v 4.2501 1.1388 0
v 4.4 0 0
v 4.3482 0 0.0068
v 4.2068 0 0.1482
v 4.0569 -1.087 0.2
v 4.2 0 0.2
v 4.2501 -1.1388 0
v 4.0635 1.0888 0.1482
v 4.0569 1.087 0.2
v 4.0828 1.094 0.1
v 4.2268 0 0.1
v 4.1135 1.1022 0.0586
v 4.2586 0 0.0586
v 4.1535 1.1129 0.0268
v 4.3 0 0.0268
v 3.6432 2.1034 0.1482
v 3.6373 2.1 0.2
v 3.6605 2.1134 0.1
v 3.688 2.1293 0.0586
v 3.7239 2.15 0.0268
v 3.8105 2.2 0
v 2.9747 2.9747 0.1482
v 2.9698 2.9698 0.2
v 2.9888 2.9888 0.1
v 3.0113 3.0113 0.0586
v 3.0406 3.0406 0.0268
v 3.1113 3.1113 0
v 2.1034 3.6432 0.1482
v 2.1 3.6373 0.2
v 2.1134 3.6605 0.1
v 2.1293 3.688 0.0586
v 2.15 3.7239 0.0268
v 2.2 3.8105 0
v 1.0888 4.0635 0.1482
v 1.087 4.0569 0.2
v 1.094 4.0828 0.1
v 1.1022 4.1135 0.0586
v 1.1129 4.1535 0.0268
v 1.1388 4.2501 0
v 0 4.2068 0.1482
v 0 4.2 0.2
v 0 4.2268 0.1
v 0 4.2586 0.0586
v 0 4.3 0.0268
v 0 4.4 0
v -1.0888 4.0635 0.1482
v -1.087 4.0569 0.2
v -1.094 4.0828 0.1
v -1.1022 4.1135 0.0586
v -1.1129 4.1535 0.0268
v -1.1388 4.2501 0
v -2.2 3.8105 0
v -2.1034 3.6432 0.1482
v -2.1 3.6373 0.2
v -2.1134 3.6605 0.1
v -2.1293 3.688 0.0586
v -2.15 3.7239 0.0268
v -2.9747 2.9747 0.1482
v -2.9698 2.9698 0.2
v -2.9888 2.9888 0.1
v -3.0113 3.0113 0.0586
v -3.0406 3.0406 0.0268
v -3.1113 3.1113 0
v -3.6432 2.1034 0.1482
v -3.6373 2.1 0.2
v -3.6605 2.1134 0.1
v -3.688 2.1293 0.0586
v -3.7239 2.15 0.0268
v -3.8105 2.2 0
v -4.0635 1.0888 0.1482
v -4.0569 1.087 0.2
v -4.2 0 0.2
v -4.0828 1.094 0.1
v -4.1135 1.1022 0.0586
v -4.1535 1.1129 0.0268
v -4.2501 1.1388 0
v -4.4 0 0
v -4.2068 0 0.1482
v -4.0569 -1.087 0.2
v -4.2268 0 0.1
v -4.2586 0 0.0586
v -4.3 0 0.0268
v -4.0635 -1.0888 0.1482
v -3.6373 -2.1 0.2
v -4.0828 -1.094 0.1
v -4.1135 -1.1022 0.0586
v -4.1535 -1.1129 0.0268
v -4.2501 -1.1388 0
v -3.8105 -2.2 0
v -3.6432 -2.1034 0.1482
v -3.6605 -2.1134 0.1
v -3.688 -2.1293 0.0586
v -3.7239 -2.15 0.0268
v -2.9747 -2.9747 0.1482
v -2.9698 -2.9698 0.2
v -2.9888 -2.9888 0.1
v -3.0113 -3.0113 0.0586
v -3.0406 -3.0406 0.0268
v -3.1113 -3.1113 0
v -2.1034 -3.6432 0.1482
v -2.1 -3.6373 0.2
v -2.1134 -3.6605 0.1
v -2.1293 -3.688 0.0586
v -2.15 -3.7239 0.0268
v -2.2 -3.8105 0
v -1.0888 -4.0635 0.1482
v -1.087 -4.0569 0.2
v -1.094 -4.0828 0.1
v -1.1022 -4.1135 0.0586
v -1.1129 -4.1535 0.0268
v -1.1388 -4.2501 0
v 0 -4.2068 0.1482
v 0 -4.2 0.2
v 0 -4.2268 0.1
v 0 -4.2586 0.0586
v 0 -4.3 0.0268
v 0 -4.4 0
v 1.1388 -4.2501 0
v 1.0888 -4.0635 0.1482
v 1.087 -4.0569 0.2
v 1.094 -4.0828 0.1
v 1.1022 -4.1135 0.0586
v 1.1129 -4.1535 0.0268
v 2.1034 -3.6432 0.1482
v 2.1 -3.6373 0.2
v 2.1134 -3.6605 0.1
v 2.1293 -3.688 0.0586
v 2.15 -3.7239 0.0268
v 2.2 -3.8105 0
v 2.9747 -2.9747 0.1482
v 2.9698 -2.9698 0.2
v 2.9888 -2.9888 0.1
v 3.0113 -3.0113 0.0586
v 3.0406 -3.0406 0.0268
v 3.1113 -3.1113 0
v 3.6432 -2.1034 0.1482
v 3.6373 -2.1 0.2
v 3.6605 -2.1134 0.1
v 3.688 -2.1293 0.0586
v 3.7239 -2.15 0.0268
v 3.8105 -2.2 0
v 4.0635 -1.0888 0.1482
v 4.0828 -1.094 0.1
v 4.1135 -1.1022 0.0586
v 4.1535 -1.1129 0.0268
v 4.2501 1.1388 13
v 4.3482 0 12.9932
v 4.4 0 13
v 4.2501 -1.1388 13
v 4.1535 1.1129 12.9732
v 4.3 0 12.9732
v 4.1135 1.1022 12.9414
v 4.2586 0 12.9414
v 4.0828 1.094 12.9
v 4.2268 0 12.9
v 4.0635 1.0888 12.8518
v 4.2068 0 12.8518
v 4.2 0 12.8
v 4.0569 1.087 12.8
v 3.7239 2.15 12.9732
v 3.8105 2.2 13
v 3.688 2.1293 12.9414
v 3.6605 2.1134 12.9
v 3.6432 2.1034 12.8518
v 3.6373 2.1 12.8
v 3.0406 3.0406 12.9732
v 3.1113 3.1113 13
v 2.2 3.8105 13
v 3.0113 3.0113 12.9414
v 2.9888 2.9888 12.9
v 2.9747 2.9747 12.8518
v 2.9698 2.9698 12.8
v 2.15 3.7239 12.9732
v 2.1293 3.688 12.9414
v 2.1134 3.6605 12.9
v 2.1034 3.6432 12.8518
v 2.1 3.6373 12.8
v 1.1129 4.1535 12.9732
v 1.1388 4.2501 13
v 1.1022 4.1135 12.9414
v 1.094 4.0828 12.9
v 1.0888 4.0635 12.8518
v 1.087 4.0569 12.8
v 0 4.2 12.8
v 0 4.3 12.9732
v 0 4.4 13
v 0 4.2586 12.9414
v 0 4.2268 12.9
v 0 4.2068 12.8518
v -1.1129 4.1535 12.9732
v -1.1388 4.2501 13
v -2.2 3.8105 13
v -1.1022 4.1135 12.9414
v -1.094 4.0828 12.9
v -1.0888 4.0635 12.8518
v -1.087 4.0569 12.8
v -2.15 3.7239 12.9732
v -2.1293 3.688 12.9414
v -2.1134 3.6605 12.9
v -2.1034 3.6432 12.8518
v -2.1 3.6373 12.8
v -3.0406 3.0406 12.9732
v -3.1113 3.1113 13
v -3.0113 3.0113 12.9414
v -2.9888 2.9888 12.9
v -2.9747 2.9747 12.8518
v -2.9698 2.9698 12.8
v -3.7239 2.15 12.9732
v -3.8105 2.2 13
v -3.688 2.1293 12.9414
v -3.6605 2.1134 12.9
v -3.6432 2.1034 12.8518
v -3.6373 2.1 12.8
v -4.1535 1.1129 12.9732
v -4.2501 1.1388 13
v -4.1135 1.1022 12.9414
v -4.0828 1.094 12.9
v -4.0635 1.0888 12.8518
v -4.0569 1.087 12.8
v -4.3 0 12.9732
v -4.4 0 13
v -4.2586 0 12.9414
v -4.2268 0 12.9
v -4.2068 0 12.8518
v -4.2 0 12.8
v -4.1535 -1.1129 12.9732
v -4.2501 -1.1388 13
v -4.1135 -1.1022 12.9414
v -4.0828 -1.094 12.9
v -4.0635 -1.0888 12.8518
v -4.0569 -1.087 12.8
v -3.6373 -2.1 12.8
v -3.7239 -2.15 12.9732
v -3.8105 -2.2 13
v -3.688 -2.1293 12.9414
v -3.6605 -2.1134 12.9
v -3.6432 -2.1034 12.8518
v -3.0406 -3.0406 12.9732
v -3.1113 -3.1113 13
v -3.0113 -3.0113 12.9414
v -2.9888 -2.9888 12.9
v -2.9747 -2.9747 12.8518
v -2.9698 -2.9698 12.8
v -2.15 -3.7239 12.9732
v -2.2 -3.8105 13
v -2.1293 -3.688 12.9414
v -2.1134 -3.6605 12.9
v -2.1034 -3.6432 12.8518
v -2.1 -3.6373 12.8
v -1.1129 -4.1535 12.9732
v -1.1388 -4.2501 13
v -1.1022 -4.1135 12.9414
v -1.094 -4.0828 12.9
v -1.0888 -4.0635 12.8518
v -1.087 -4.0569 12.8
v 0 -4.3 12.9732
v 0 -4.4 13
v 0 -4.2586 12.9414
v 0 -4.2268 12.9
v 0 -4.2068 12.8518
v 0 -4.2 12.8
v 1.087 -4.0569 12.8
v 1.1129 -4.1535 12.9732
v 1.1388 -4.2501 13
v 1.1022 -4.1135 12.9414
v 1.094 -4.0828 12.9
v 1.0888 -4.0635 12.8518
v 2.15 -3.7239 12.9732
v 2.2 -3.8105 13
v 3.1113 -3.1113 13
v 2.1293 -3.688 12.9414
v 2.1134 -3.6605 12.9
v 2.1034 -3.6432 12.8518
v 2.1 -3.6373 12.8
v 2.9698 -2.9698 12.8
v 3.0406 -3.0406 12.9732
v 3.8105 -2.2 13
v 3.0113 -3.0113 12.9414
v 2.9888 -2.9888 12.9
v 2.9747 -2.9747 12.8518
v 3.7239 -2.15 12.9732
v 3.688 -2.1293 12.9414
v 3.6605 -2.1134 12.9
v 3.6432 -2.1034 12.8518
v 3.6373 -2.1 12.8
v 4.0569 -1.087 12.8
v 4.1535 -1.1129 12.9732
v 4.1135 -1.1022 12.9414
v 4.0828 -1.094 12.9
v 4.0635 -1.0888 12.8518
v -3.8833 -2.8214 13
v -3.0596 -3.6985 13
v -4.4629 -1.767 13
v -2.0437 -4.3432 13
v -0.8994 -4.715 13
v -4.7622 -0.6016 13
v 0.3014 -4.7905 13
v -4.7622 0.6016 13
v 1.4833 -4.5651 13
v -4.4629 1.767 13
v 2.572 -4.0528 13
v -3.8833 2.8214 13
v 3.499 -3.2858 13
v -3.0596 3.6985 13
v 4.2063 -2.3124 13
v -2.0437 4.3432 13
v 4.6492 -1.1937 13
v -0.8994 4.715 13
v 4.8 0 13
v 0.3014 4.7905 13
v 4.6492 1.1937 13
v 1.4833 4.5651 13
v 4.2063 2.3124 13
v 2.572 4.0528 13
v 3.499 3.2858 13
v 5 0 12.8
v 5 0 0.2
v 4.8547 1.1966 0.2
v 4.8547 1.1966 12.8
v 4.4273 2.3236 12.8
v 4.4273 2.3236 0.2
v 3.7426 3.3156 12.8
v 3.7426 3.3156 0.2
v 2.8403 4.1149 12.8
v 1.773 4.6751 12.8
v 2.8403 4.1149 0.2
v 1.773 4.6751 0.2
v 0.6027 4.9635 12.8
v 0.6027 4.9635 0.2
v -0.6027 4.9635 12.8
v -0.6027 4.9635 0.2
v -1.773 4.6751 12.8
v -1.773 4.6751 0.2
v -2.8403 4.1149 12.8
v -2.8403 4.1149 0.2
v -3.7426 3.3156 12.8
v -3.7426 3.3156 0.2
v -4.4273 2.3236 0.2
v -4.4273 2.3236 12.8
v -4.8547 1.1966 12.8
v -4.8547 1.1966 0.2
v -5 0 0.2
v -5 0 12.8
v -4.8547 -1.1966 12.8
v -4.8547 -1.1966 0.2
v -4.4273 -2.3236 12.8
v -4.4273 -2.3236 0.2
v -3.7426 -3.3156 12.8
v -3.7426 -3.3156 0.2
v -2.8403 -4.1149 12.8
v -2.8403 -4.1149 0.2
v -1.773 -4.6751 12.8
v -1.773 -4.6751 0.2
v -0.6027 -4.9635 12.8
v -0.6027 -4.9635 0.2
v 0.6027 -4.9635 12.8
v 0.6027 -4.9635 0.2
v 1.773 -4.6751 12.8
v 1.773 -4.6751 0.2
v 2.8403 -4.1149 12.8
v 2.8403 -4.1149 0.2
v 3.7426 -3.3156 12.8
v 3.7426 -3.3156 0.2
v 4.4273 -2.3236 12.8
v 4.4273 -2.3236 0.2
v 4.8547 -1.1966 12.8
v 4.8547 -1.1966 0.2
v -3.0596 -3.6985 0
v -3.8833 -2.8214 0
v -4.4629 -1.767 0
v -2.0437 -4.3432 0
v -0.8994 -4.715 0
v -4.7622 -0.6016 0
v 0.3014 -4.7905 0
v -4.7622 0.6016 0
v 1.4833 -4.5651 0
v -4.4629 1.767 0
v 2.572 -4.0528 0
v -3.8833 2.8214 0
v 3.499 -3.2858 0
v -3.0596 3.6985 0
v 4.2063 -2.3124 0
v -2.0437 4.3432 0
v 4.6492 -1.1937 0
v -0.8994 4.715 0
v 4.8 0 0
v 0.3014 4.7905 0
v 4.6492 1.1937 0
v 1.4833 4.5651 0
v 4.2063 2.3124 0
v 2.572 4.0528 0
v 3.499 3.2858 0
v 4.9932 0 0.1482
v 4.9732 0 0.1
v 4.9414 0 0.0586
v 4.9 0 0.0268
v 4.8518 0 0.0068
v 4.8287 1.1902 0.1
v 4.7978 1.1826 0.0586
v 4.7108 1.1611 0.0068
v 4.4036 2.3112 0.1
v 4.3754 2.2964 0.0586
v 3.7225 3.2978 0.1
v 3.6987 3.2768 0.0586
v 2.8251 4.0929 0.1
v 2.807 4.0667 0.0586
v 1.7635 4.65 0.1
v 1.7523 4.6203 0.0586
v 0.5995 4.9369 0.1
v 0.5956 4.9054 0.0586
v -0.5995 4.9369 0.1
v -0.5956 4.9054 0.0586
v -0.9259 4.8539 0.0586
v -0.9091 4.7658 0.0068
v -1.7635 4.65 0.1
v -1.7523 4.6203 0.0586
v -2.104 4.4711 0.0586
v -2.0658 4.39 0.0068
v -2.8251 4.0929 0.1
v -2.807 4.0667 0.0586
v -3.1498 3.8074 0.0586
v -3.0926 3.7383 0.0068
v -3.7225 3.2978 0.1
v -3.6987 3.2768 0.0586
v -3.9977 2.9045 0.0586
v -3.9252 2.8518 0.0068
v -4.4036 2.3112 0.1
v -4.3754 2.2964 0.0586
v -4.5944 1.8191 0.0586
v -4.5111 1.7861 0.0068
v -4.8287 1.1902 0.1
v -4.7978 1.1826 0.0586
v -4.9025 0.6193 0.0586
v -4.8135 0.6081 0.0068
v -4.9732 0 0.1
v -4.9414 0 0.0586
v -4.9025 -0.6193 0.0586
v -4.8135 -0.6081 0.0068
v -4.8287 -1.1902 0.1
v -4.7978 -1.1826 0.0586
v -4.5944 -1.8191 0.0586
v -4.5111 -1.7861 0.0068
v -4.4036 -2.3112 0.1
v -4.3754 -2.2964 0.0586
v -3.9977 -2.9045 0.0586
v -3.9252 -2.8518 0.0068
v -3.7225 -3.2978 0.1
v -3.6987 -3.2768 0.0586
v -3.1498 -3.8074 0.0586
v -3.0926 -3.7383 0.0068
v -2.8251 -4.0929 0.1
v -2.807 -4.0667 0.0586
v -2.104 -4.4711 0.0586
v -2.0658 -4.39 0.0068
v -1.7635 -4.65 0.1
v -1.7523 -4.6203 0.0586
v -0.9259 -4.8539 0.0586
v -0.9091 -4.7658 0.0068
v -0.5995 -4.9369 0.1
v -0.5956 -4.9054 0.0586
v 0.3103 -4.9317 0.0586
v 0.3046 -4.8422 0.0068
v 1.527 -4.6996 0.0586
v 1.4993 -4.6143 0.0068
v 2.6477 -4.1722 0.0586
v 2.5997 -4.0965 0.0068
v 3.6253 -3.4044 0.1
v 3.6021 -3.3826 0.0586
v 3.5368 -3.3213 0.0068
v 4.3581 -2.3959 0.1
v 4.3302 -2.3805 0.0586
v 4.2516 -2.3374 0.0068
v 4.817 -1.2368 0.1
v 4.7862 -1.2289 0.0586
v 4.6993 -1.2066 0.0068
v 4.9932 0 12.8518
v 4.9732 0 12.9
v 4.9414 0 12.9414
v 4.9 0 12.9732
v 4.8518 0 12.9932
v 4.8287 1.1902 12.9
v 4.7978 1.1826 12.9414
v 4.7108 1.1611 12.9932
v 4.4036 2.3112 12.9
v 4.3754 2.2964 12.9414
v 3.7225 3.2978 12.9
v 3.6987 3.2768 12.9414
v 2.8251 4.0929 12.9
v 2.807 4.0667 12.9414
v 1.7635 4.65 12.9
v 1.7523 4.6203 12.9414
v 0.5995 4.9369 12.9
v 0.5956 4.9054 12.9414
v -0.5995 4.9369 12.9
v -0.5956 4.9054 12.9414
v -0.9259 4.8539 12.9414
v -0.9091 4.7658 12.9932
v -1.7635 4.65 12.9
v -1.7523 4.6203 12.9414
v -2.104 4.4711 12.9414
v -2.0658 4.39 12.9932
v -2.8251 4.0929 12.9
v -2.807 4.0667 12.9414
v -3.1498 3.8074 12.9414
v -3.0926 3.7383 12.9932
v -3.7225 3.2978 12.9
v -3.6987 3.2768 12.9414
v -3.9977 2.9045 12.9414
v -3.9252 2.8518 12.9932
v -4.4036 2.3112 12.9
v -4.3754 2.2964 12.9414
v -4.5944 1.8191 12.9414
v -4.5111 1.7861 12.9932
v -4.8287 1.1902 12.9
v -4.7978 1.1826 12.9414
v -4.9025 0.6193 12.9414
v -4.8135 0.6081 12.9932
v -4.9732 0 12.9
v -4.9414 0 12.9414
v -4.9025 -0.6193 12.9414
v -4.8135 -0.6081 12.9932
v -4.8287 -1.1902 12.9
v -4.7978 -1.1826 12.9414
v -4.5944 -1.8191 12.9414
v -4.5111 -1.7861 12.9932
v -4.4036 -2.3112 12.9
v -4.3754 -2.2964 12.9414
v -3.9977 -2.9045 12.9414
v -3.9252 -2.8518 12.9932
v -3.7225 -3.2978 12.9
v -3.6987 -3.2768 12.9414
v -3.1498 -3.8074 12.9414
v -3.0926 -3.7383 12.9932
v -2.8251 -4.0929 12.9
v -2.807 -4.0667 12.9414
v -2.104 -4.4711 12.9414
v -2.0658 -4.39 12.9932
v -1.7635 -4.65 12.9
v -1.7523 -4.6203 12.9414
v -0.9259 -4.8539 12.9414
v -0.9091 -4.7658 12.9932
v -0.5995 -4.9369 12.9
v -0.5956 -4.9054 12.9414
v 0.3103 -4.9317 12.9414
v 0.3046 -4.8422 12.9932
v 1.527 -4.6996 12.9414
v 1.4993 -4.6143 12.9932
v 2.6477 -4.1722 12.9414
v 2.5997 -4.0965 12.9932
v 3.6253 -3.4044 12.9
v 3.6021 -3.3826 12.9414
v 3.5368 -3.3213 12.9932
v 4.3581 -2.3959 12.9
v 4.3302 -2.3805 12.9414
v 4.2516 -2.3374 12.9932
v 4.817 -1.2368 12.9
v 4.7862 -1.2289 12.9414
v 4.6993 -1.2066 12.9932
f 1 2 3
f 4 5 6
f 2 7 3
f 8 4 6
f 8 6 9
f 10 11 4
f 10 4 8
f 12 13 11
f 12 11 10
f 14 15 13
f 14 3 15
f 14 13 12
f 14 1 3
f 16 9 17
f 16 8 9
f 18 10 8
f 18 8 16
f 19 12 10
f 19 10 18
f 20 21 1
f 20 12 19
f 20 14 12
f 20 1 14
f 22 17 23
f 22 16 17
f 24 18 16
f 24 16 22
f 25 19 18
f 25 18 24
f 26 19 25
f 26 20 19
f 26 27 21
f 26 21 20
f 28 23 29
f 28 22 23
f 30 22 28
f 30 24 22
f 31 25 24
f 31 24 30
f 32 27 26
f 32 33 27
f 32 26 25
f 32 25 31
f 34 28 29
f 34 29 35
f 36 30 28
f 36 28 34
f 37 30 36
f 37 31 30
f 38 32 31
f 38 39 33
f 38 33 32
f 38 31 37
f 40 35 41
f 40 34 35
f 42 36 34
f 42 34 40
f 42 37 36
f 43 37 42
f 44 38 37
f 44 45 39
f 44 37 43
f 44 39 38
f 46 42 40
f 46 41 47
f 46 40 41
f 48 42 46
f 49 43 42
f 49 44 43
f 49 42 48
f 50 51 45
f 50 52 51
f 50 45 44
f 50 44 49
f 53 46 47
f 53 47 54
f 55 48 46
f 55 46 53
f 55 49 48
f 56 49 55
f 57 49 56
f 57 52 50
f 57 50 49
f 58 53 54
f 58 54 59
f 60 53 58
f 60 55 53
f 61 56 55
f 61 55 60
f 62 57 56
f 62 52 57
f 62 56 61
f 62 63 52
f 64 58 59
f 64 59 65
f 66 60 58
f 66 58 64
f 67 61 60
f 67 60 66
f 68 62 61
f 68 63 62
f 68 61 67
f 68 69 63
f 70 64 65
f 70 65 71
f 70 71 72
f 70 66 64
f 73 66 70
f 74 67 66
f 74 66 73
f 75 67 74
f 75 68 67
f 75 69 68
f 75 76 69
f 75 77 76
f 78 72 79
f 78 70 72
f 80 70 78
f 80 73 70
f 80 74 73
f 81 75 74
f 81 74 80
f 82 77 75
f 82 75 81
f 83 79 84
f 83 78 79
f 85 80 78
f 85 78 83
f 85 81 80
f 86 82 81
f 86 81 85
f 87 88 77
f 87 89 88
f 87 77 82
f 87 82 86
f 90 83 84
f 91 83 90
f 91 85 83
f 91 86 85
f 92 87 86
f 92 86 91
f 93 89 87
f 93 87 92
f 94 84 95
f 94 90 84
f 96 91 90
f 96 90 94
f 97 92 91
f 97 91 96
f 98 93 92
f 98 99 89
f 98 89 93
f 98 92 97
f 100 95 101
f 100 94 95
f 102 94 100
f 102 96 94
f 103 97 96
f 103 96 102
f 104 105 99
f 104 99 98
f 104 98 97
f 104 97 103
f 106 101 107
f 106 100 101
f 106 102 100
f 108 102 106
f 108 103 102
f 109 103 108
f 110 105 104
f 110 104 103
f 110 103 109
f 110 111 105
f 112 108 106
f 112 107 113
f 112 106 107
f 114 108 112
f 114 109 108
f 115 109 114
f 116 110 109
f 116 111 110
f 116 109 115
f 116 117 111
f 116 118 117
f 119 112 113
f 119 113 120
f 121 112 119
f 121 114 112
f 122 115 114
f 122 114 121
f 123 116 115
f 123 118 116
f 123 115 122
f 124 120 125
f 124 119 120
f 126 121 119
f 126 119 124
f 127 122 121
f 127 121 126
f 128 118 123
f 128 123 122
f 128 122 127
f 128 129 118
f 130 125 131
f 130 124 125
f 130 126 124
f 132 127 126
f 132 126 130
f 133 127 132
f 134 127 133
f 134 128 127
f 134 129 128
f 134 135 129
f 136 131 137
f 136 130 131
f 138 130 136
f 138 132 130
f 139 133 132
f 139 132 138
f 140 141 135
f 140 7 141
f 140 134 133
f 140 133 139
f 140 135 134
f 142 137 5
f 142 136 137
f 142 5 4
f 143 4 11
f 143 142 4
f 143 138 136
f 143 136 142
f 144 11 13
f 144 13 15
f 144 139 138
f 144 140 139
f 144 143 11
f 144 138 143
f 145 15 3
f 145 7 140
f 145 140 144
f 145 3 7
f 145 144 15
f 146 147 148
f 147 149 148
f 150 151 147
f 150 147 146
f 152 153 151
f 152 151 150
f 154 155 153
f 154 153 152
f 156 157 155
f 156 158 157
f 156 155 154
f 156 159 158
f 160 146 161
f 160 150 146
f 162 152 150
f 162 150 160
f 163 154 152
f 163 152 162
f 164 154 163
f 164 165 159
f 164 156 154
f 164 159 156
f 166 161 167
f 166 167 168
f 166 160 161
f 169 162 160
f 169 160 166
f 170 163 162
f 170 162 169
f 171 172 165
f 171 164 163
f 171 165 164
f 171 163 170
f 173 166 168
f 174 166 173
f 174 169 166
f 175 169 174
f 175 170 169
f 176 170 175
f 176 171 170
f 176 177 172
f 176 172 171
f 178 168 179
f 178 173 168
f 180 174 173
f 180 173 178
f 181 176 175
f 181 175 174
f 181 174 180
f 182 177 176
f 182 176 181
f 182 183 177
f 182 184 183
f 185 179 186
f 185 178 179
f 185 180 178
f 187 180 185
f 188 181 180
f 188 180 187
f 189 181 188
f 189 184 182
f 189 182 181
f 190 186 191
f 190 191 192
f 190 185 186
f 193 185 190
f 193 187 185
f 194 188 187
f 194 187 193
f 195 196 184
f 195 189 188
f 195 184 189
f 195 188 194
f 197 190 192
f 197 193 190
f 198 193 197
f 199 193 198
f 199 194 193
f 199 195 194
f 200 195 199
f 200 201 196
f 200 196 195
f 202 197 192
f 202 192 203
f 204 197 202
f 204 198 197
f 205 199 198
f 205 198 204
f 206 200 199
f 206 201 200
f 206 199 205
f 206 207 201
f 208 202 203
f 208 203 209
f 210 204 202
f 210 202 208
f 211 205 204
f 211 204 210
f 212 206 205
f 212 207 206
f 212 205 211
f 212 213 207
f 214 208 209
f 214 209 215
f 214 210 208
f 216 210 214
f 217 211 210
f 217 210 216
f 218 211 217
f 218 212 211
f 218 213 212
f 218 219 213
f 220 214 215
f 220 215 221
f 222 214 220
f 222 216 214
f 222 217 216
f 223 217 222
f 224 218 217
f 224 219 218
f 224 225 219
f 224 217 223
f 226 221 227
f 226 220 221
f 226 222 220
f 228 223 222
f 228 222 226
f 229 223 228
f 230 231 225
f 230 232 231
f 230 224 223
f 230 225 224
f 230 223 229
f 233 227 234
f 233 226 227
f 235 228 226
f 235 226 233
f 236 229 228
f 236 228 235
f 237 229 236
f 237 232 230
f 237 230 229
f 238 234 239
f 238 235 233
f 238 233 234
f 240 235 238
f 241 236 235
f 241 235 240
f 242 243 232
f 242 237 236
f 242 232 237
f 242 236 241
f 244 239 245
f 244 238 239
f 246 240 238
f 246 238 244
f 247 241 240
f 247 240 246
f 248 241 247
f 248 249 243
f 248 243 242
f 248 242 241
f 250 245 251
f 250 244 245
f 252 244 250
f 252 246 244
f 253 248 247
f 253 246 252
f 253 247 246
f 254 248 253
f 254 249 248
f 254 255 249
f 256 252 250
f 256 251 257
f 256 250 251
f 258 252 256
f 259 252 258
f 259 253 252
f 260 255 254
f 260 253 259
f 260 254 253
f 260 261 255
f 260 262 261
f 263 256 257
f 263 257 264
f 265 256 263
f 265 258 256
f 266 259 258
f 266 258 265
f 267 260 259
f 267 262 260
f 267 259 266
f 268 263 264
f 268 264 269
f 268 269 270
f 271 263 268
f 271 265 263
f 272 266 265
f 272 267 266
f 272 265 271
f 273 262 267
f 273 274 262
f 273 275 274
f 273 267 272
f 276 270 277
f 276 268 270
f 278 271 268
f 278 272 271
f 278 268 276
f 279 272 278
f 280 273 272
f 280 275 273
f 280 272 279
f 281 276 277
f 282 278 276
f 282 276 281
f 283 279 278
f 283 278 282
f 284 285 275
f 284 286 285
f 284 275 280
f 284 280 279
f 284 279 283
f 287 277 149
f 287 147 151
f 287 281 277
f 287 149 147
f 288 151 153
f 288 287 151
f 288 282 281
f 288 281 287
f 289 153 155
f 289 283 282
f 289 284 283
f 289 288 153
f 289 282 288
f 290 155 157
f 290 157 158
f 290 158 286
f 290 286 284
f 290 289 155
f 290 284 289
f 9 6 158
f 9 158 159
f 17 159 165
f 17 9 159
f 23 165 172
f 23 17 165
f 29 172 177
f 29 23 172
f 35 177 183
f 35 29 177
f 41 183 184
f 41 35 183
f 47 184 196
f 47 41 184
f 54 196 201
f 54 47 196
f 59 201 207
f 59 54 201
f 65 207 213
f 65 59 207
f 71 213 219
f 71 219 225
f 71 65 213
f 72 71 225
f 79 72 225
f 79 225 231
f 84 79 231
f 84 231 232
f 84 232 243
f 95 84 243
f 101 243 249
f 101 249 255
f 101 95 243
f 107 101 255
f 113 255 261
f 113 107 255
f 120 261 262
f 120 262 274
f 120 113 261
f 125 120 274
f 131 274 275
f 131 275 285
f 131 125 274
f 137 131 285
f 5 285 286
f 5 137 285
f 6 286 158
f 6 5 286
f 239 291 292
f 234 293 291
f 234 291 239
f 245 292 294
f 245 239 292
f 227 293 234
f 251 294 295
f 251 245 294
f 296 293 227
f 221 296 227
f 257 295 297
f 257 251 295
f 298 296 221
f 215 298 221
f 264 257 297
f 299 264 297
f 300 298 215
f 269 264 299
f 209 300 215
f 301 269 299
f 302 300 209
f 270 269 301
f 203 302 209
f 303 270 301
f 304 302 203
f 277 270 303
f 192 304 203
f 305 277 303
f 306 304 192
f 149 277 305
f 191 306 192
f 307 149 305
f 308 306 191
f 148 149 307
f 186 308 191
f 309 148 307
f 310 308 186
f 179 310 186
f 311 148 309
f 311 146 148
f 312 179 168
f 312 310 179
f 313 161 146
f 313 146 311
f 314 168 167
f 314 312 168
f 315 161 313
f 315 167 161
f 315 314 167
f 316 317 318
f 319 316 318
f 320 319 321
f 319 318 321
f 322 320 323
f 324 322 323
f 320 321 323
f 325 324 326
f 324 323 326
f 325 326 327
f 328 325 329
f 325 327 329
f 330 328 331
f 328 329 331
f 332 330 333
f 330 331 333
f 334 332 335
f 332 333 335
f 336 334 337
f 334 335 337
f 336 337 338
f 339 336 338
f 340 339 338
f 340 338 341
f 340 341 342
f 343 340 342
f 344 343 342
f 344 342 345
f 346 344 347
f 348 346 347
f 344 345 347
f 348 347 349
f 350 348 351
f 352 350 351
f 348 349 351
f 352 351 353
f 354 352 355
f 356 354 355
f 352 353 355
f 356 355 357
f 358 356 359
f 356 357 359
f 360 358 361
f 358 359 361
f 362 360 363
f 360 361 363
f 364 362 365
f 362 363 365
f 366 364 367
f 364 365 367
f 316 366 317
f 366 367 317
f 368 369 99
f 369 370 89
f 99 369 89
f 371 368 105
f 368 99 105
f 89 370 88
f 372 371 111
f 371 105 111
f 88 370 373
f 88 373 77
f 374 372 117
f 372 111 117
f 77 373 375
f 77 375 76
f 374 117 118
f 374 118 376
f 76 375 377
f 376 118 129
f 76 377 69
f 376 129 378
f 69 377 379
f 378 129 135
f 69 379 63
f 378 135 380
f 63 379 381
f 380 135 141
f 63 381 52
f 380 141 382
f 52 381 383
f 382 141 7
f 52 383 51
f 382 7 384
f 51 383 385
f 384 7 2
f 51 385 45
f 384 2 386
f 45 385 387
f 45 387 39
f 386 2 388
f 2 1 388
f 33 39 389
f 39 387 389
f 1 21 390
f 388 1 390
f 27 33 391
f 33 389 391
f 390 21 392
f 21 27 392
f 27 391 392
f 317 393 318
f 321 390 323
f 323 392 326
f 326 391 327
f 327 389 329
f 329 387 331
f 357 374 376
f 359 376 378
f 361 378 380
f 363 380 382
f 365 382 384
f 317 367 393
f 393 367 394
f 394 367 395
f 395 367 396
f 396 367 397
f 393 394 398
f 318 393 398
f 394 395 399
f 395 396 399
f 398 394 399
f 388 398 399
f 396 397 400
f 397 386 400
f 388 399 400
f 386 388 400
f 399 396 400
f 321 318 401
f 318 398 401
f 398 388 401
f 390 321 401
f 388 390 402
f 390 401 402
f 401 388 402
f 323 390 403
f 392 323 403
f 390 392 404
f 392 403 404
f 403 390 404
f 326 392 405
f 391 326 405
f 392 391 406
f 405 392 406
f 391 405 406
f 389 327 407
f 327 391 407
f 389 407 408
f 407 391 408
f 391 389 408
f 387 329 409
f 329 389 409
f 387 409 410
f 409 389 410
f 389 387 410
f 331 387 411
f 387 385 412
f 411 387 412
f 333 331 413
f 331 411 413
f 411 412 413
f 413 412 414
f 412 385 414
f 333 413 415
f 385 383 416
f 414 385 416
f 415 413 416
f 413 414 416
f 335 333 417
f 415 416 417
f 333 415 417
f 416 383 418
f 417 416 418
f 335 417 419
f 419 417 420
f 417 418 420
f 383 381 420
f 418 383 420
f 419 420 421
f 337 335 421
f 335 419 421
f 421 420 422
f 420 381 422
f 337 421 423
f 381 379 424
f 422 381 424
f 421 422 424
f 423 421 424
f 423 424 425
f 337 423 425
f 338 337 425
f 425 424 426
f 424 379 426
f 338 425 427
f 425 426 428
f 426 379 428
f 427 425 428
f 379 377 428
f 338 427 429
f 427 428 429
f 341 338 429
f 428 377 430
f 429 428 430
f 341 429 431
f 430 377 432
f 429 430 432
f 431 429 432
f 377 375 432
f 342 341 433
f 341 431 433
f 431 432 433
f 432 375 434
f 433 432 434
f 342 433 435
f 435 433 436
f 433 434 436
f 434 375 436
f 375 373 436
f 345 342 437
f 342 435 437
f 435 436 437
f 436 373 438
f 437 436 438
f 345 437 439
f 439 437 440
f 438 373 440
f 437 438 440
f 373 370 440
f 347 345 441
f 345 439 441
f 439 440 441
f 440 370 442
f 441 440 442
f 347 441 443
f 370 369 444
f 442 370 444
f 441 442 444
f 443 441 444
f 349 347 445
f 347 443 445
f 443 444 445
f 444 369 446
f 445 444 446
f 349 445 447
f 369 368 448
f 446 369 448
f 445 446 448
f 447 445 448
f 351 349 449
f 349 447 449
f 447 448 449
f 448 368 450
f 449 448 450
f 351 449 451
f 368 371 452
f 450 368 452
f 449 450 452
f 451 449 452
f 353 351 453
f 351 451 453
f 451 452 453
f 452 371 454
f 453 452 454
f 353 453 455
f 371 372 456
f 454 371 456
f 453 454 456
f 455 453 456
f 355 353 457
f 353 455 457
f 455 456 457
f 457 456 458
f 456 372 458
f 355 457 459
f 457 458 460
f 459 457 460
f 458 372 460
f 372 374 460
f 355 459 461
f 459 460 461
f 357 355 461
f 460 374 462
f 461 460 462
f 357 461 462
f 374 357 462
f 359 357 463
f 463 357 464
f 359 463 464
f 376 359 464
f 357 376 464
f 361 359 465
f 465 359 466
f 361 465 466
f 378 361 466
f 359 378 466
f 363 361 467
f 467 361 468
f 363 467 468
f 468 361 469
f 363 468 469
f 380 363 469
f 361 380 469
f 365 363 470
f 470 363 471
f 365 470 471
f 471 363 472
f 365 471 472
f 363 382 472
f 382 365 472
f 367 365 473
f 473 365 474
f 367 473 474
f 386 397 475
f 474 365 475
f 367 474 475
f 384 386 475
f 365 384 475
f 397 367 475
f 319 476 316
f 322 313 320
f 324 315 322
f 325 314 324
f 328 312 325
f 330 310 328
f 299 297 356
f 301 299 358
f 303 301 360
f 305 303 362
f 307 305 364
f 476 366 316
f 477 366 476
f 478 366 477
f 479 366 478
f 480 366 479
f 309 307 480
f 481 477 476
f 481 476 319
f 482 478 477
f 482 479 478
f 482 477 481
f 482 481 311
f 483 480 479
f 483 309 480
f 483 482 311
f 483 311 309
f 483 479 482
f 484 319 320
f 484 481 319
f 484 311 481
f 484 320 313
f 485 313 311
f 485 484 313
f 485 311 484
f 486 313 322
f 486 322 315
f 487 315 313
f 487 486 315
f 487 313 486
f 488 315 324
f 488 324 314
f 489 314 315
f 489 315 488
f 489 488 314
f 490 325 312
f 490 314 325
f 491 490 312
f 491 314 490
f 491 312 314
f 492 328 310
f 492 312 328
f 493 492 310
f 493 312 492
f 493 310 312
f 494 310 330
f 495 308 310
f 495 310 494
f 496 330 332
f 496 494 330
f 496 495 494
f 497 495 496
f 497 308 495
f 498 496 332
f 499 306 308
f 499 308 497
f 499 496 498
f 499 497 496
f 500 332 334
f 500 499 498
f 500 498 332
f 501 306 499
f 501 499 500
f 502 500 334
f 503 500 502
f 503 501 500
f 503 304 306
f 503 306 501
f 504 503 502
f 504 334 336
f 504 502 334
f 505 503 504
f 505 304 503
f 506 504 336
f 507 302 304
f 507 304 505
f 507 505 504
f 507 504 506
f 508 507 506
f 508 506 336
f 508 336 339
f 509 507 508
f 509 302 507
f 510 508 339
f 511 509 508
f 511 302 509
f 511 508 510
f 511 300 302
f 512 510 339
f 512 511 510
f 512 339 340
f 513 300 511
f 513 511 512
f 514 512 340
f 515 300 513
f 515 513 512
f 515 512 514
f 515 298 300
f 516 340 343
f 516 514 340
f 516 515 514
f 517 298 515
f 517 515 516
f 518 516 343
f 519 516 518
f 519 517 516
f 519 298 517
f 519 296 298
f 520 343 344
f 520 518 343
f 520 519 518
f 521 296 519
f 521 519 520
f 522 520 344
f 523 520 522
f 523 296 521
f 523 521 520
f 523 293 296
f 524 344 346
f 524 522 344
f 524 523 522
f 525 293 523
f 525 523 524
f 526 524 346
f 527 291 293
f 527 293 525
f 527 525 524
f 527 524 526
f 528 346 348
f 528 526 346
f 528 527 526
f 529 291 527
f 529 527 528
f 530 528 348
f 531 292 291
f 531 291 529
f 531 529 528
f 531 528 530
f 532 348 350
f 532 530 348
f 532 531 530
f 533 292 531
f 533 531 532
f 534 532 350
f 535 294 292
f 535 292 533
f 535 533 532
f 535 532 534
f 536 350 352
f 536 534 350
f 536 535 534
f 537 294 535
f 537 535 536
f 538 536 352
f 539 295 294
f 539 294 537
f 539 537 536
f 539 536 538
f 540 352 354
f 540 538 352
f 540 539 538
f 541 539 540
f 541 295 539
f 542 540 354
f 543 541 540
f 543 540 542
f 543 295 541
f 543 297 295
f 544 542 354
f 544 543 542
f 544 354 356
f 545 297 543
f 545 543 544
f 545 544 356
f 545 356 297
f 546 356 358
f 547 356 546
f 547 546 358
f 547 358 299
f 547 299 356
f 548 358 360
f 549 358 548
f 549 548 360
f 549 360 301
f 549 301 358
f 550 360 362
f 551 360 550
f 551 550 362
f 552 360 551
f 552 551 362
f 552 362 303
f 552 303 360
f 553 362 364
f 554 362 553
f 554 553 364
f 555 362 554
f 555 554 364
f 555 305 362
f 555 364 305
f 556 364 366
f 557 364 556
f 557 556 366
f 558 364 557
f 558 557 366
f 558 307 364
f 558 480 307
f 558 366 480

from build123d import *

# Parameters (mm, degrees)
SKETCH_R    = 5
SKETCH_R_2  = 4.2
PAD_DEPTH   = 13
FILLET_R    = 0.2
FILLET001_R = 0.2


with BuildPart() as part:
    # Sketch → Pad (new body)
    with BuildSketch(Plane.XY):
        Circle(SKETCH_R)
        Circle(SKETCH_R_2, mode=Mode.SUBTRACT)
    extrude(amount=PAD_DEPTH)

    # Fillet
    fillet_edges = [part.edges().sort_by_distance(p)[0] for p in [
        (-5, 0, 0),
        (-4.2, 0, 0),
    ]]
    fillet(fillet_edges, radius=FILLET_R)

    # Fillet001
    fillet001_edges = [part.edges().sort_by_distance(p)[0] for p in [
        (-5, 0, 13),
        (-4.2, 0, 13),
    ]]
    fillet(fillet001_edges, radius=FILLET001_R)


solid = part.part
